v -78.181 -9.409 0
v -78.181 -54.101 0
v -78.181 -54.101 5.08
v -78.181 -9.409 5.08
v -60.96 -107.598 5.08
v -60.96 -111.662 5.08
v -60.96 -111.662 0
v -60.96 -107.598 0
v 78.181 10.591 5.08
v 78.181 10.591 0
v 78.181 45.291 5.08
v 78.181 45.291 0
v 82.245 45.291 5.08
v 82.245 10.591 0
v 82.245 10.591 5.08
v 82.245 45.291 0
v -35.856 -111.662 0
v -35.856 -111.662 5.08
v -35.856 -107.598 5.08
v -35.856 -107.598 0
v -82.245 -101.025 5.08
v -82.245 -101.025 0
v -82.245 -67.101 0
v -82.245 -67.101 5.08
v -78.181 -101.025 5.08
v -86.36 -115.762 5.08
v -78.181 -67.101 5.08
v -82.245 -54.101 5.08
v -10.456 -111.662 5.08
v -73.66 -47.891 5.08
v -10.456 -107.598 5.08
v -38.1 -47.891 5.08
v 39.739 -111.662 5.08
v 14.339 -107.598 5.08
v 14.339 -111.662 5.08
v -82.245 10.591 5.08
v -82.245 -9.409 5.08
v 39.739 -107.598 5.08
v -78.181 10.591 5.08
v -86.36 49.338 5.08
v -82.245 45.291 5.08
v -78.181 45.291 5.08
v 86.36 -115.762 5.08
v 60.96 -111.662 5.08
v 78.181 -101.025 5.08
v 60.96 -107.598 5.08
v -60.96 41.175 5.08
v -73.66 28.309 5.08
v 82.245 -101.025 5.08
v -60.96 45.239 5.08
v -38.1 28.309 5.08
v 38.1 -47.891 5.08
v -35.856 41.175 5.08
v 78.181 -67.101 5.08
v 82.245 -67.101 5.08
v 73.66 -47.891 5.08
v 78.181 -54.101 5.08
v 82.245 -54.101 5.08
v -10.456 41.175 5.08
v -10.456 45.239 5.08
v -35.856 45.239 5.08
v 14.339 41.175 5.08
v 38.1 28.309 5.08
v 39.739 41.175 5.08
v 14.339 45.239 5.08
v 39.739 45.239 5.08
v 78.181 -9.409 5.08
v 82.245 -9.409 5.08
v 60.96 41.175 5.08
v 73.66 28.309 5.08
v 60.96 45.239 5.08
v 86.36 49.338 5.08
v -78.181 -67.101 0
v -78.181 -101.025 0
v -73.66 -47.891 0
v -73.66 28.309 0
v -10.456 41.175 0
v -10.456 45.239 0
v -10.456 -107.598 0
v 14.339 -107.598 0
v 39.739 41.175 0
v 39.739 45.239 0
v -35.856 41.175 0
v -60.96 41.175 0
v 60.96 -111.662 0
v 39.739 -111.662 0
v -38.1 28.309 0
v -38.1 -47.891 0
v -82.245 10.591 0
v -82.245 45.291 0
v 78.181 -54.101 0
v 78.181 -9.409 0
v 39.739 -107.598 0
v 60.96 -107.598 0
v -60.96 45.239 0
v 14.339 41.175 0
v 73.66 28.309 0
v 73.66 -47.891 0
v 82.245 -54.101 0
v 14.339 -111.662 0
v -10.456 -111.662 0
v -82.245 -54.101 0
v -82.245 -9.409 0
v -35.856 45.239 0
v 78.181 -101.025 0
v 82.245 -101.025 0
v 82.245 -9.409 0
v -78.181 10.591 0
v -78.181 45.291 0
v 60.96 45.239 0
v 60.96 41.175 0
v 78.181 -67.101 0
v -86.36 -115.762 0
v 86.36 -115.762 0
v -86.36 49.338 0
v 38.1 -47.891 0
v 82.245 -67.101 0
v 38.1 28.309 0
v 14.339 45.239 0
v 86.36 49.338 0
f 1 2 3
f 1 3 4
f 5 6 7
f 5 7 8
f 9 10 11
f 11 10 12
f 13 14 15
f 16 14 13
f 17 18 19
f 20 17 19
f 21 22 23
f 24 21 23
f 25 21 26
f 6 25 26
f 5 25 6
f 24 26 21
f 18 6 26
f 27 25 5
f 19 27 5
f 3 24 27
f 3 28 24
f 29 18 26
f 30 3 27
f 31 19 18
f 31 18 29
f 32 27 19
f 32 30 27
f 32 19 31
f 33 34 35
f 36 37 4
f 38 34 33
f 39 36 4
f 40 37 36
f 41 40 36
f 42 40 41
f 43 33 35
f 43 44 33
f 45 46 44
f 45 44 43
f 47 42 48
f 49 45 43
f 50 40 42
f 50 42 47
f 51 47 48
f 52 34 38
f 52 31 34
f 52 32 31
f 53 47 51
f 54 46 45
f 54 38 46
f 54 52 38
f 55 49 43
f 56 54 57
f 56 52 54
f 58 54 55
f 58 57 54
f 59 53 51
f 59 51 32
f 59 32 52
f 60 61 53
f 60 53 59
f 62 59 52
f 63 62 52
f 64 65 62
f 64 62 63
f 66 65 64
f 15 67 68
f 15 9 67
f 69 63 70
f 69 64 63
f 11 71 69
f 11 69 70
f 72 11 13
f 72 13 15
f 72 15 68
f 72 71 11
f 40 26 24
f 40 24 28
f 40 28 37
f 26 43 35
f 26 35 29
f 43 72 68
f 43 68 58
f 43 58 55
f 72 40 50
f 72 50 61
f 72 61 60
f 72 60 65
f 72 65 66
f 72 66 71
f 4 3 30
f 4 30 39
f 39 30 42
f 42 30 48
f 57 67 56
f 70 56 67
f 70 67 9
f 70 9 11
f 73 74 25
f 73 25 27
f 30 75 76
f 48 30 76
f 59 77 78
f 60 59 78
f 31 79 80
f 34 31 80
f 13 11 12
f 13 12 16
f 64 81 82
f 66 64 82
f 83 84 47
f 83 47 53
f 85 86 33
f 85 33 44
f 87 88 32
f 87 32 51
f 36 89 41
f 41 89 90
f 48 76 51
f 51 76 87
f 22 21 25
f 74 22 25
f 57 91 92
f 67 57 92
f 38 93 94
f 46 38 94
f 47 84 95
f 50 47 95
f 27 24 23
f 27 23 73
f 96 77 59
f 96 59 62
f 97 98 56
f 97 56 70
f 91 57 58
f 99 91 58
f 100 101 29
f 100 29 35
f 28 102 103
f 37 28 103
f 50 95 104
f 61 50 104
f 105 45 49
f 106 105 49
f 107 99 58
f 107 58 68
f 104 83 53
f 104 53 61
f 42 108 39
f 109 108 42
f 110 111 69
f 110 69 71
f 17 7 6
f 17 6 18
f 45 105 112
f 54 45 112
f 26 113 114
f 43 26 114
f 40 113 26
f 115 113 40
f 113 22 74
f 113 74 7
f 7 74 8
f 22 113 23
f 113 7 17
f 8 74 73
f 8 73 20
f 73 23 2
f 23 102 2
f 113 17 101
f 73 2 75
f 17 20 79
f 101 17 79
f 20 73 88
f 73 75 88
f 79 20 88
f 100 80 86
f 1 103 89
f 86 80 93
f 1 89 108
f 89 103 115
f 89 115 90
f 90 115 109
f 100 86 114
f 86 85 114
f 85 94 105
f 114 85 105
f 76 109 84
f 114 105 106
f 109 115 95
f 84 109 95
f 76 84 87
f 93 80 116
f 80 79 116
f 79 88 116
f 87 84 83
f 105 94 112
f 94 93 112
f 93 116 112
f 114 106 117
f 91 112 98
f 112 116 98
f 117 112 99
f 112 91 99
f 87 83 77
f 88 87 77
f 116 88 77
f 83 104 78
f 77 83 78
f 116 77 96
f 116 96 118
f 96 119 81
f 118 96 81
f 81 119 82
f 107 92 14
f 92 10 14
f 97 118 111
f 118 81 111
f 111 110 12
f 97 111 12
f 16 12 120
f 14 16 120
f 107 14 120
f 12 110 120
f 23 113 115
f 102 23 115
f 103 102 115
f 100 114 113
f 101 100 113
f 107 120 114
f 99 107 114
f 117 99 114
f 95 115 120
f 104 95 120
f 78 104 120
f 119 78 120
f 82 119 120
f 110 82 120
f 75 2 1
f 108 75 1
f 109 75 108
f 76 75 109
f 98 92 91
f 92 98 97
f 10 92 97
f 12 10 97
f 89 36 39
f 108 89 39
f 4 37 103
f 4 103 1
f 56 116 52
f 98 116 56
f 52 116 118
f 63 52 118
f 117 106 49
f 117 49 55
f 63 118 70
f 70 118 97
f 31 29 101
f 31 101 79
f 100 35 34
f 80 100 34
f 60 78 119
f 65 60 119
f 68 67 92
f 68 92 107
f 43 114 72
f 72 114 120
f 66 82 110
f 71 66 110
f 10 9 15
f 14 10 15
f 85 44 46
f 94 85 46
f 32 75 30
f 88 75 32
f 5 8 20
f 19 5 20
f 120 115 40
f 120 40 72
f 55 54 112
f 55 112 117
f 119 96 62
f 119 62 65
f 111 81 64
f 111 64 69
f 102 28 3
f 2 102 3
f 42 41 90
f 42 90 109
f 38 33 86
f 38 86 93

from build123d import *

# Parameters (mm, degrees)
F0_W     = 172.72
F0_H     = 165.1
F0_W_2   = 25.104146
F0_H_2   = 4.064
F0_W_3   = 4.064
F0_H_3   = 33.9242
F0_W_4   = 24.795201
F0_W_5   = 21.220653
F0_H_4   = 44.69198
F0_W_6   = 35.56
F0_H_5   = 76.2
F0_H_6   = 34.7
F1_DEPTH = 5.08


with BuildPart() as f1:
    # F0 (on Top) → F1 (new body)
    with BuildSketch(Plane.XY):
        with Locations((0, -33.211574)):
            Rectangle(F0_W, F0_H)
        with Locations((-48.407927, -109.63035)):
            Rectangle(F0_W_2, F0_H_2, mode=Mode.SUBTRACT)
        with Locations((-80.213484, -84.063285)):
            Rectangle(F0_W_3, F0_H_3, mode=Mode.SUBTRACT)
        with Locations((1.941747, -109.63035)):
            Rectangle(F0_W_4, F0_H_2, mode=Mode.SUBTRACT)
        with Locations((50.349673, -109.63035)):
            Rectangle(F0_W_5, F0_H_2, mode=Mode.SUBTRACT)
        with Locations((80.213484, -84.063285)):
            Rectangle(F0_W_3, F0_H_3, mode=Mode.SUBTRACT)
        with Locations((-80.213484, -31.755195)):
            Rectangle(F0_W_3, F0_H_4, mode=Mode.SUBTRACT)
        with Locations((-55.88, -9.791071)):
            Rectangle(F0_W_6, F0_H_5, mode=Mode.SUBTRACT)
        with Locations((-80.213484, 27.940795)):
            Rectangle(F0_W_3, F0_H_6, mode=Mode.SUBTRACT)
        with Locations((-48.407927, 43.207203)):
            Rectangle(F0_W_2, F0_H_2, mode=Mode.SUBTRACT)
        with Locations((80.213484, -31.755195)):
            Rectangle(F0_W_3, F0_H_4, mode=Mode.SUBTRACT)
        with Locations((55.88, -9.791071)):
            Rectangle(F0_W_6, F0_H_5, mode=Mode.SUBTRACT)
        with Locations((1.941747, 43.207203)):
            Rectangle(F0_W_4, F0_H_2, mode=Mode.SUBTRACT)
        with Locations((80.213484, 27.940795)):
            Rectangle(F0_W_3, F0_H_6, mode=Mode.SUBTRACT)
        with Locations((50.349673, 43.207203)):
            Rectangle(F0_W_5, F0_H_2, mode=Mode.SUBTRACT)
    extrude(amount=F1_DEPTH)


solid = f1.part
